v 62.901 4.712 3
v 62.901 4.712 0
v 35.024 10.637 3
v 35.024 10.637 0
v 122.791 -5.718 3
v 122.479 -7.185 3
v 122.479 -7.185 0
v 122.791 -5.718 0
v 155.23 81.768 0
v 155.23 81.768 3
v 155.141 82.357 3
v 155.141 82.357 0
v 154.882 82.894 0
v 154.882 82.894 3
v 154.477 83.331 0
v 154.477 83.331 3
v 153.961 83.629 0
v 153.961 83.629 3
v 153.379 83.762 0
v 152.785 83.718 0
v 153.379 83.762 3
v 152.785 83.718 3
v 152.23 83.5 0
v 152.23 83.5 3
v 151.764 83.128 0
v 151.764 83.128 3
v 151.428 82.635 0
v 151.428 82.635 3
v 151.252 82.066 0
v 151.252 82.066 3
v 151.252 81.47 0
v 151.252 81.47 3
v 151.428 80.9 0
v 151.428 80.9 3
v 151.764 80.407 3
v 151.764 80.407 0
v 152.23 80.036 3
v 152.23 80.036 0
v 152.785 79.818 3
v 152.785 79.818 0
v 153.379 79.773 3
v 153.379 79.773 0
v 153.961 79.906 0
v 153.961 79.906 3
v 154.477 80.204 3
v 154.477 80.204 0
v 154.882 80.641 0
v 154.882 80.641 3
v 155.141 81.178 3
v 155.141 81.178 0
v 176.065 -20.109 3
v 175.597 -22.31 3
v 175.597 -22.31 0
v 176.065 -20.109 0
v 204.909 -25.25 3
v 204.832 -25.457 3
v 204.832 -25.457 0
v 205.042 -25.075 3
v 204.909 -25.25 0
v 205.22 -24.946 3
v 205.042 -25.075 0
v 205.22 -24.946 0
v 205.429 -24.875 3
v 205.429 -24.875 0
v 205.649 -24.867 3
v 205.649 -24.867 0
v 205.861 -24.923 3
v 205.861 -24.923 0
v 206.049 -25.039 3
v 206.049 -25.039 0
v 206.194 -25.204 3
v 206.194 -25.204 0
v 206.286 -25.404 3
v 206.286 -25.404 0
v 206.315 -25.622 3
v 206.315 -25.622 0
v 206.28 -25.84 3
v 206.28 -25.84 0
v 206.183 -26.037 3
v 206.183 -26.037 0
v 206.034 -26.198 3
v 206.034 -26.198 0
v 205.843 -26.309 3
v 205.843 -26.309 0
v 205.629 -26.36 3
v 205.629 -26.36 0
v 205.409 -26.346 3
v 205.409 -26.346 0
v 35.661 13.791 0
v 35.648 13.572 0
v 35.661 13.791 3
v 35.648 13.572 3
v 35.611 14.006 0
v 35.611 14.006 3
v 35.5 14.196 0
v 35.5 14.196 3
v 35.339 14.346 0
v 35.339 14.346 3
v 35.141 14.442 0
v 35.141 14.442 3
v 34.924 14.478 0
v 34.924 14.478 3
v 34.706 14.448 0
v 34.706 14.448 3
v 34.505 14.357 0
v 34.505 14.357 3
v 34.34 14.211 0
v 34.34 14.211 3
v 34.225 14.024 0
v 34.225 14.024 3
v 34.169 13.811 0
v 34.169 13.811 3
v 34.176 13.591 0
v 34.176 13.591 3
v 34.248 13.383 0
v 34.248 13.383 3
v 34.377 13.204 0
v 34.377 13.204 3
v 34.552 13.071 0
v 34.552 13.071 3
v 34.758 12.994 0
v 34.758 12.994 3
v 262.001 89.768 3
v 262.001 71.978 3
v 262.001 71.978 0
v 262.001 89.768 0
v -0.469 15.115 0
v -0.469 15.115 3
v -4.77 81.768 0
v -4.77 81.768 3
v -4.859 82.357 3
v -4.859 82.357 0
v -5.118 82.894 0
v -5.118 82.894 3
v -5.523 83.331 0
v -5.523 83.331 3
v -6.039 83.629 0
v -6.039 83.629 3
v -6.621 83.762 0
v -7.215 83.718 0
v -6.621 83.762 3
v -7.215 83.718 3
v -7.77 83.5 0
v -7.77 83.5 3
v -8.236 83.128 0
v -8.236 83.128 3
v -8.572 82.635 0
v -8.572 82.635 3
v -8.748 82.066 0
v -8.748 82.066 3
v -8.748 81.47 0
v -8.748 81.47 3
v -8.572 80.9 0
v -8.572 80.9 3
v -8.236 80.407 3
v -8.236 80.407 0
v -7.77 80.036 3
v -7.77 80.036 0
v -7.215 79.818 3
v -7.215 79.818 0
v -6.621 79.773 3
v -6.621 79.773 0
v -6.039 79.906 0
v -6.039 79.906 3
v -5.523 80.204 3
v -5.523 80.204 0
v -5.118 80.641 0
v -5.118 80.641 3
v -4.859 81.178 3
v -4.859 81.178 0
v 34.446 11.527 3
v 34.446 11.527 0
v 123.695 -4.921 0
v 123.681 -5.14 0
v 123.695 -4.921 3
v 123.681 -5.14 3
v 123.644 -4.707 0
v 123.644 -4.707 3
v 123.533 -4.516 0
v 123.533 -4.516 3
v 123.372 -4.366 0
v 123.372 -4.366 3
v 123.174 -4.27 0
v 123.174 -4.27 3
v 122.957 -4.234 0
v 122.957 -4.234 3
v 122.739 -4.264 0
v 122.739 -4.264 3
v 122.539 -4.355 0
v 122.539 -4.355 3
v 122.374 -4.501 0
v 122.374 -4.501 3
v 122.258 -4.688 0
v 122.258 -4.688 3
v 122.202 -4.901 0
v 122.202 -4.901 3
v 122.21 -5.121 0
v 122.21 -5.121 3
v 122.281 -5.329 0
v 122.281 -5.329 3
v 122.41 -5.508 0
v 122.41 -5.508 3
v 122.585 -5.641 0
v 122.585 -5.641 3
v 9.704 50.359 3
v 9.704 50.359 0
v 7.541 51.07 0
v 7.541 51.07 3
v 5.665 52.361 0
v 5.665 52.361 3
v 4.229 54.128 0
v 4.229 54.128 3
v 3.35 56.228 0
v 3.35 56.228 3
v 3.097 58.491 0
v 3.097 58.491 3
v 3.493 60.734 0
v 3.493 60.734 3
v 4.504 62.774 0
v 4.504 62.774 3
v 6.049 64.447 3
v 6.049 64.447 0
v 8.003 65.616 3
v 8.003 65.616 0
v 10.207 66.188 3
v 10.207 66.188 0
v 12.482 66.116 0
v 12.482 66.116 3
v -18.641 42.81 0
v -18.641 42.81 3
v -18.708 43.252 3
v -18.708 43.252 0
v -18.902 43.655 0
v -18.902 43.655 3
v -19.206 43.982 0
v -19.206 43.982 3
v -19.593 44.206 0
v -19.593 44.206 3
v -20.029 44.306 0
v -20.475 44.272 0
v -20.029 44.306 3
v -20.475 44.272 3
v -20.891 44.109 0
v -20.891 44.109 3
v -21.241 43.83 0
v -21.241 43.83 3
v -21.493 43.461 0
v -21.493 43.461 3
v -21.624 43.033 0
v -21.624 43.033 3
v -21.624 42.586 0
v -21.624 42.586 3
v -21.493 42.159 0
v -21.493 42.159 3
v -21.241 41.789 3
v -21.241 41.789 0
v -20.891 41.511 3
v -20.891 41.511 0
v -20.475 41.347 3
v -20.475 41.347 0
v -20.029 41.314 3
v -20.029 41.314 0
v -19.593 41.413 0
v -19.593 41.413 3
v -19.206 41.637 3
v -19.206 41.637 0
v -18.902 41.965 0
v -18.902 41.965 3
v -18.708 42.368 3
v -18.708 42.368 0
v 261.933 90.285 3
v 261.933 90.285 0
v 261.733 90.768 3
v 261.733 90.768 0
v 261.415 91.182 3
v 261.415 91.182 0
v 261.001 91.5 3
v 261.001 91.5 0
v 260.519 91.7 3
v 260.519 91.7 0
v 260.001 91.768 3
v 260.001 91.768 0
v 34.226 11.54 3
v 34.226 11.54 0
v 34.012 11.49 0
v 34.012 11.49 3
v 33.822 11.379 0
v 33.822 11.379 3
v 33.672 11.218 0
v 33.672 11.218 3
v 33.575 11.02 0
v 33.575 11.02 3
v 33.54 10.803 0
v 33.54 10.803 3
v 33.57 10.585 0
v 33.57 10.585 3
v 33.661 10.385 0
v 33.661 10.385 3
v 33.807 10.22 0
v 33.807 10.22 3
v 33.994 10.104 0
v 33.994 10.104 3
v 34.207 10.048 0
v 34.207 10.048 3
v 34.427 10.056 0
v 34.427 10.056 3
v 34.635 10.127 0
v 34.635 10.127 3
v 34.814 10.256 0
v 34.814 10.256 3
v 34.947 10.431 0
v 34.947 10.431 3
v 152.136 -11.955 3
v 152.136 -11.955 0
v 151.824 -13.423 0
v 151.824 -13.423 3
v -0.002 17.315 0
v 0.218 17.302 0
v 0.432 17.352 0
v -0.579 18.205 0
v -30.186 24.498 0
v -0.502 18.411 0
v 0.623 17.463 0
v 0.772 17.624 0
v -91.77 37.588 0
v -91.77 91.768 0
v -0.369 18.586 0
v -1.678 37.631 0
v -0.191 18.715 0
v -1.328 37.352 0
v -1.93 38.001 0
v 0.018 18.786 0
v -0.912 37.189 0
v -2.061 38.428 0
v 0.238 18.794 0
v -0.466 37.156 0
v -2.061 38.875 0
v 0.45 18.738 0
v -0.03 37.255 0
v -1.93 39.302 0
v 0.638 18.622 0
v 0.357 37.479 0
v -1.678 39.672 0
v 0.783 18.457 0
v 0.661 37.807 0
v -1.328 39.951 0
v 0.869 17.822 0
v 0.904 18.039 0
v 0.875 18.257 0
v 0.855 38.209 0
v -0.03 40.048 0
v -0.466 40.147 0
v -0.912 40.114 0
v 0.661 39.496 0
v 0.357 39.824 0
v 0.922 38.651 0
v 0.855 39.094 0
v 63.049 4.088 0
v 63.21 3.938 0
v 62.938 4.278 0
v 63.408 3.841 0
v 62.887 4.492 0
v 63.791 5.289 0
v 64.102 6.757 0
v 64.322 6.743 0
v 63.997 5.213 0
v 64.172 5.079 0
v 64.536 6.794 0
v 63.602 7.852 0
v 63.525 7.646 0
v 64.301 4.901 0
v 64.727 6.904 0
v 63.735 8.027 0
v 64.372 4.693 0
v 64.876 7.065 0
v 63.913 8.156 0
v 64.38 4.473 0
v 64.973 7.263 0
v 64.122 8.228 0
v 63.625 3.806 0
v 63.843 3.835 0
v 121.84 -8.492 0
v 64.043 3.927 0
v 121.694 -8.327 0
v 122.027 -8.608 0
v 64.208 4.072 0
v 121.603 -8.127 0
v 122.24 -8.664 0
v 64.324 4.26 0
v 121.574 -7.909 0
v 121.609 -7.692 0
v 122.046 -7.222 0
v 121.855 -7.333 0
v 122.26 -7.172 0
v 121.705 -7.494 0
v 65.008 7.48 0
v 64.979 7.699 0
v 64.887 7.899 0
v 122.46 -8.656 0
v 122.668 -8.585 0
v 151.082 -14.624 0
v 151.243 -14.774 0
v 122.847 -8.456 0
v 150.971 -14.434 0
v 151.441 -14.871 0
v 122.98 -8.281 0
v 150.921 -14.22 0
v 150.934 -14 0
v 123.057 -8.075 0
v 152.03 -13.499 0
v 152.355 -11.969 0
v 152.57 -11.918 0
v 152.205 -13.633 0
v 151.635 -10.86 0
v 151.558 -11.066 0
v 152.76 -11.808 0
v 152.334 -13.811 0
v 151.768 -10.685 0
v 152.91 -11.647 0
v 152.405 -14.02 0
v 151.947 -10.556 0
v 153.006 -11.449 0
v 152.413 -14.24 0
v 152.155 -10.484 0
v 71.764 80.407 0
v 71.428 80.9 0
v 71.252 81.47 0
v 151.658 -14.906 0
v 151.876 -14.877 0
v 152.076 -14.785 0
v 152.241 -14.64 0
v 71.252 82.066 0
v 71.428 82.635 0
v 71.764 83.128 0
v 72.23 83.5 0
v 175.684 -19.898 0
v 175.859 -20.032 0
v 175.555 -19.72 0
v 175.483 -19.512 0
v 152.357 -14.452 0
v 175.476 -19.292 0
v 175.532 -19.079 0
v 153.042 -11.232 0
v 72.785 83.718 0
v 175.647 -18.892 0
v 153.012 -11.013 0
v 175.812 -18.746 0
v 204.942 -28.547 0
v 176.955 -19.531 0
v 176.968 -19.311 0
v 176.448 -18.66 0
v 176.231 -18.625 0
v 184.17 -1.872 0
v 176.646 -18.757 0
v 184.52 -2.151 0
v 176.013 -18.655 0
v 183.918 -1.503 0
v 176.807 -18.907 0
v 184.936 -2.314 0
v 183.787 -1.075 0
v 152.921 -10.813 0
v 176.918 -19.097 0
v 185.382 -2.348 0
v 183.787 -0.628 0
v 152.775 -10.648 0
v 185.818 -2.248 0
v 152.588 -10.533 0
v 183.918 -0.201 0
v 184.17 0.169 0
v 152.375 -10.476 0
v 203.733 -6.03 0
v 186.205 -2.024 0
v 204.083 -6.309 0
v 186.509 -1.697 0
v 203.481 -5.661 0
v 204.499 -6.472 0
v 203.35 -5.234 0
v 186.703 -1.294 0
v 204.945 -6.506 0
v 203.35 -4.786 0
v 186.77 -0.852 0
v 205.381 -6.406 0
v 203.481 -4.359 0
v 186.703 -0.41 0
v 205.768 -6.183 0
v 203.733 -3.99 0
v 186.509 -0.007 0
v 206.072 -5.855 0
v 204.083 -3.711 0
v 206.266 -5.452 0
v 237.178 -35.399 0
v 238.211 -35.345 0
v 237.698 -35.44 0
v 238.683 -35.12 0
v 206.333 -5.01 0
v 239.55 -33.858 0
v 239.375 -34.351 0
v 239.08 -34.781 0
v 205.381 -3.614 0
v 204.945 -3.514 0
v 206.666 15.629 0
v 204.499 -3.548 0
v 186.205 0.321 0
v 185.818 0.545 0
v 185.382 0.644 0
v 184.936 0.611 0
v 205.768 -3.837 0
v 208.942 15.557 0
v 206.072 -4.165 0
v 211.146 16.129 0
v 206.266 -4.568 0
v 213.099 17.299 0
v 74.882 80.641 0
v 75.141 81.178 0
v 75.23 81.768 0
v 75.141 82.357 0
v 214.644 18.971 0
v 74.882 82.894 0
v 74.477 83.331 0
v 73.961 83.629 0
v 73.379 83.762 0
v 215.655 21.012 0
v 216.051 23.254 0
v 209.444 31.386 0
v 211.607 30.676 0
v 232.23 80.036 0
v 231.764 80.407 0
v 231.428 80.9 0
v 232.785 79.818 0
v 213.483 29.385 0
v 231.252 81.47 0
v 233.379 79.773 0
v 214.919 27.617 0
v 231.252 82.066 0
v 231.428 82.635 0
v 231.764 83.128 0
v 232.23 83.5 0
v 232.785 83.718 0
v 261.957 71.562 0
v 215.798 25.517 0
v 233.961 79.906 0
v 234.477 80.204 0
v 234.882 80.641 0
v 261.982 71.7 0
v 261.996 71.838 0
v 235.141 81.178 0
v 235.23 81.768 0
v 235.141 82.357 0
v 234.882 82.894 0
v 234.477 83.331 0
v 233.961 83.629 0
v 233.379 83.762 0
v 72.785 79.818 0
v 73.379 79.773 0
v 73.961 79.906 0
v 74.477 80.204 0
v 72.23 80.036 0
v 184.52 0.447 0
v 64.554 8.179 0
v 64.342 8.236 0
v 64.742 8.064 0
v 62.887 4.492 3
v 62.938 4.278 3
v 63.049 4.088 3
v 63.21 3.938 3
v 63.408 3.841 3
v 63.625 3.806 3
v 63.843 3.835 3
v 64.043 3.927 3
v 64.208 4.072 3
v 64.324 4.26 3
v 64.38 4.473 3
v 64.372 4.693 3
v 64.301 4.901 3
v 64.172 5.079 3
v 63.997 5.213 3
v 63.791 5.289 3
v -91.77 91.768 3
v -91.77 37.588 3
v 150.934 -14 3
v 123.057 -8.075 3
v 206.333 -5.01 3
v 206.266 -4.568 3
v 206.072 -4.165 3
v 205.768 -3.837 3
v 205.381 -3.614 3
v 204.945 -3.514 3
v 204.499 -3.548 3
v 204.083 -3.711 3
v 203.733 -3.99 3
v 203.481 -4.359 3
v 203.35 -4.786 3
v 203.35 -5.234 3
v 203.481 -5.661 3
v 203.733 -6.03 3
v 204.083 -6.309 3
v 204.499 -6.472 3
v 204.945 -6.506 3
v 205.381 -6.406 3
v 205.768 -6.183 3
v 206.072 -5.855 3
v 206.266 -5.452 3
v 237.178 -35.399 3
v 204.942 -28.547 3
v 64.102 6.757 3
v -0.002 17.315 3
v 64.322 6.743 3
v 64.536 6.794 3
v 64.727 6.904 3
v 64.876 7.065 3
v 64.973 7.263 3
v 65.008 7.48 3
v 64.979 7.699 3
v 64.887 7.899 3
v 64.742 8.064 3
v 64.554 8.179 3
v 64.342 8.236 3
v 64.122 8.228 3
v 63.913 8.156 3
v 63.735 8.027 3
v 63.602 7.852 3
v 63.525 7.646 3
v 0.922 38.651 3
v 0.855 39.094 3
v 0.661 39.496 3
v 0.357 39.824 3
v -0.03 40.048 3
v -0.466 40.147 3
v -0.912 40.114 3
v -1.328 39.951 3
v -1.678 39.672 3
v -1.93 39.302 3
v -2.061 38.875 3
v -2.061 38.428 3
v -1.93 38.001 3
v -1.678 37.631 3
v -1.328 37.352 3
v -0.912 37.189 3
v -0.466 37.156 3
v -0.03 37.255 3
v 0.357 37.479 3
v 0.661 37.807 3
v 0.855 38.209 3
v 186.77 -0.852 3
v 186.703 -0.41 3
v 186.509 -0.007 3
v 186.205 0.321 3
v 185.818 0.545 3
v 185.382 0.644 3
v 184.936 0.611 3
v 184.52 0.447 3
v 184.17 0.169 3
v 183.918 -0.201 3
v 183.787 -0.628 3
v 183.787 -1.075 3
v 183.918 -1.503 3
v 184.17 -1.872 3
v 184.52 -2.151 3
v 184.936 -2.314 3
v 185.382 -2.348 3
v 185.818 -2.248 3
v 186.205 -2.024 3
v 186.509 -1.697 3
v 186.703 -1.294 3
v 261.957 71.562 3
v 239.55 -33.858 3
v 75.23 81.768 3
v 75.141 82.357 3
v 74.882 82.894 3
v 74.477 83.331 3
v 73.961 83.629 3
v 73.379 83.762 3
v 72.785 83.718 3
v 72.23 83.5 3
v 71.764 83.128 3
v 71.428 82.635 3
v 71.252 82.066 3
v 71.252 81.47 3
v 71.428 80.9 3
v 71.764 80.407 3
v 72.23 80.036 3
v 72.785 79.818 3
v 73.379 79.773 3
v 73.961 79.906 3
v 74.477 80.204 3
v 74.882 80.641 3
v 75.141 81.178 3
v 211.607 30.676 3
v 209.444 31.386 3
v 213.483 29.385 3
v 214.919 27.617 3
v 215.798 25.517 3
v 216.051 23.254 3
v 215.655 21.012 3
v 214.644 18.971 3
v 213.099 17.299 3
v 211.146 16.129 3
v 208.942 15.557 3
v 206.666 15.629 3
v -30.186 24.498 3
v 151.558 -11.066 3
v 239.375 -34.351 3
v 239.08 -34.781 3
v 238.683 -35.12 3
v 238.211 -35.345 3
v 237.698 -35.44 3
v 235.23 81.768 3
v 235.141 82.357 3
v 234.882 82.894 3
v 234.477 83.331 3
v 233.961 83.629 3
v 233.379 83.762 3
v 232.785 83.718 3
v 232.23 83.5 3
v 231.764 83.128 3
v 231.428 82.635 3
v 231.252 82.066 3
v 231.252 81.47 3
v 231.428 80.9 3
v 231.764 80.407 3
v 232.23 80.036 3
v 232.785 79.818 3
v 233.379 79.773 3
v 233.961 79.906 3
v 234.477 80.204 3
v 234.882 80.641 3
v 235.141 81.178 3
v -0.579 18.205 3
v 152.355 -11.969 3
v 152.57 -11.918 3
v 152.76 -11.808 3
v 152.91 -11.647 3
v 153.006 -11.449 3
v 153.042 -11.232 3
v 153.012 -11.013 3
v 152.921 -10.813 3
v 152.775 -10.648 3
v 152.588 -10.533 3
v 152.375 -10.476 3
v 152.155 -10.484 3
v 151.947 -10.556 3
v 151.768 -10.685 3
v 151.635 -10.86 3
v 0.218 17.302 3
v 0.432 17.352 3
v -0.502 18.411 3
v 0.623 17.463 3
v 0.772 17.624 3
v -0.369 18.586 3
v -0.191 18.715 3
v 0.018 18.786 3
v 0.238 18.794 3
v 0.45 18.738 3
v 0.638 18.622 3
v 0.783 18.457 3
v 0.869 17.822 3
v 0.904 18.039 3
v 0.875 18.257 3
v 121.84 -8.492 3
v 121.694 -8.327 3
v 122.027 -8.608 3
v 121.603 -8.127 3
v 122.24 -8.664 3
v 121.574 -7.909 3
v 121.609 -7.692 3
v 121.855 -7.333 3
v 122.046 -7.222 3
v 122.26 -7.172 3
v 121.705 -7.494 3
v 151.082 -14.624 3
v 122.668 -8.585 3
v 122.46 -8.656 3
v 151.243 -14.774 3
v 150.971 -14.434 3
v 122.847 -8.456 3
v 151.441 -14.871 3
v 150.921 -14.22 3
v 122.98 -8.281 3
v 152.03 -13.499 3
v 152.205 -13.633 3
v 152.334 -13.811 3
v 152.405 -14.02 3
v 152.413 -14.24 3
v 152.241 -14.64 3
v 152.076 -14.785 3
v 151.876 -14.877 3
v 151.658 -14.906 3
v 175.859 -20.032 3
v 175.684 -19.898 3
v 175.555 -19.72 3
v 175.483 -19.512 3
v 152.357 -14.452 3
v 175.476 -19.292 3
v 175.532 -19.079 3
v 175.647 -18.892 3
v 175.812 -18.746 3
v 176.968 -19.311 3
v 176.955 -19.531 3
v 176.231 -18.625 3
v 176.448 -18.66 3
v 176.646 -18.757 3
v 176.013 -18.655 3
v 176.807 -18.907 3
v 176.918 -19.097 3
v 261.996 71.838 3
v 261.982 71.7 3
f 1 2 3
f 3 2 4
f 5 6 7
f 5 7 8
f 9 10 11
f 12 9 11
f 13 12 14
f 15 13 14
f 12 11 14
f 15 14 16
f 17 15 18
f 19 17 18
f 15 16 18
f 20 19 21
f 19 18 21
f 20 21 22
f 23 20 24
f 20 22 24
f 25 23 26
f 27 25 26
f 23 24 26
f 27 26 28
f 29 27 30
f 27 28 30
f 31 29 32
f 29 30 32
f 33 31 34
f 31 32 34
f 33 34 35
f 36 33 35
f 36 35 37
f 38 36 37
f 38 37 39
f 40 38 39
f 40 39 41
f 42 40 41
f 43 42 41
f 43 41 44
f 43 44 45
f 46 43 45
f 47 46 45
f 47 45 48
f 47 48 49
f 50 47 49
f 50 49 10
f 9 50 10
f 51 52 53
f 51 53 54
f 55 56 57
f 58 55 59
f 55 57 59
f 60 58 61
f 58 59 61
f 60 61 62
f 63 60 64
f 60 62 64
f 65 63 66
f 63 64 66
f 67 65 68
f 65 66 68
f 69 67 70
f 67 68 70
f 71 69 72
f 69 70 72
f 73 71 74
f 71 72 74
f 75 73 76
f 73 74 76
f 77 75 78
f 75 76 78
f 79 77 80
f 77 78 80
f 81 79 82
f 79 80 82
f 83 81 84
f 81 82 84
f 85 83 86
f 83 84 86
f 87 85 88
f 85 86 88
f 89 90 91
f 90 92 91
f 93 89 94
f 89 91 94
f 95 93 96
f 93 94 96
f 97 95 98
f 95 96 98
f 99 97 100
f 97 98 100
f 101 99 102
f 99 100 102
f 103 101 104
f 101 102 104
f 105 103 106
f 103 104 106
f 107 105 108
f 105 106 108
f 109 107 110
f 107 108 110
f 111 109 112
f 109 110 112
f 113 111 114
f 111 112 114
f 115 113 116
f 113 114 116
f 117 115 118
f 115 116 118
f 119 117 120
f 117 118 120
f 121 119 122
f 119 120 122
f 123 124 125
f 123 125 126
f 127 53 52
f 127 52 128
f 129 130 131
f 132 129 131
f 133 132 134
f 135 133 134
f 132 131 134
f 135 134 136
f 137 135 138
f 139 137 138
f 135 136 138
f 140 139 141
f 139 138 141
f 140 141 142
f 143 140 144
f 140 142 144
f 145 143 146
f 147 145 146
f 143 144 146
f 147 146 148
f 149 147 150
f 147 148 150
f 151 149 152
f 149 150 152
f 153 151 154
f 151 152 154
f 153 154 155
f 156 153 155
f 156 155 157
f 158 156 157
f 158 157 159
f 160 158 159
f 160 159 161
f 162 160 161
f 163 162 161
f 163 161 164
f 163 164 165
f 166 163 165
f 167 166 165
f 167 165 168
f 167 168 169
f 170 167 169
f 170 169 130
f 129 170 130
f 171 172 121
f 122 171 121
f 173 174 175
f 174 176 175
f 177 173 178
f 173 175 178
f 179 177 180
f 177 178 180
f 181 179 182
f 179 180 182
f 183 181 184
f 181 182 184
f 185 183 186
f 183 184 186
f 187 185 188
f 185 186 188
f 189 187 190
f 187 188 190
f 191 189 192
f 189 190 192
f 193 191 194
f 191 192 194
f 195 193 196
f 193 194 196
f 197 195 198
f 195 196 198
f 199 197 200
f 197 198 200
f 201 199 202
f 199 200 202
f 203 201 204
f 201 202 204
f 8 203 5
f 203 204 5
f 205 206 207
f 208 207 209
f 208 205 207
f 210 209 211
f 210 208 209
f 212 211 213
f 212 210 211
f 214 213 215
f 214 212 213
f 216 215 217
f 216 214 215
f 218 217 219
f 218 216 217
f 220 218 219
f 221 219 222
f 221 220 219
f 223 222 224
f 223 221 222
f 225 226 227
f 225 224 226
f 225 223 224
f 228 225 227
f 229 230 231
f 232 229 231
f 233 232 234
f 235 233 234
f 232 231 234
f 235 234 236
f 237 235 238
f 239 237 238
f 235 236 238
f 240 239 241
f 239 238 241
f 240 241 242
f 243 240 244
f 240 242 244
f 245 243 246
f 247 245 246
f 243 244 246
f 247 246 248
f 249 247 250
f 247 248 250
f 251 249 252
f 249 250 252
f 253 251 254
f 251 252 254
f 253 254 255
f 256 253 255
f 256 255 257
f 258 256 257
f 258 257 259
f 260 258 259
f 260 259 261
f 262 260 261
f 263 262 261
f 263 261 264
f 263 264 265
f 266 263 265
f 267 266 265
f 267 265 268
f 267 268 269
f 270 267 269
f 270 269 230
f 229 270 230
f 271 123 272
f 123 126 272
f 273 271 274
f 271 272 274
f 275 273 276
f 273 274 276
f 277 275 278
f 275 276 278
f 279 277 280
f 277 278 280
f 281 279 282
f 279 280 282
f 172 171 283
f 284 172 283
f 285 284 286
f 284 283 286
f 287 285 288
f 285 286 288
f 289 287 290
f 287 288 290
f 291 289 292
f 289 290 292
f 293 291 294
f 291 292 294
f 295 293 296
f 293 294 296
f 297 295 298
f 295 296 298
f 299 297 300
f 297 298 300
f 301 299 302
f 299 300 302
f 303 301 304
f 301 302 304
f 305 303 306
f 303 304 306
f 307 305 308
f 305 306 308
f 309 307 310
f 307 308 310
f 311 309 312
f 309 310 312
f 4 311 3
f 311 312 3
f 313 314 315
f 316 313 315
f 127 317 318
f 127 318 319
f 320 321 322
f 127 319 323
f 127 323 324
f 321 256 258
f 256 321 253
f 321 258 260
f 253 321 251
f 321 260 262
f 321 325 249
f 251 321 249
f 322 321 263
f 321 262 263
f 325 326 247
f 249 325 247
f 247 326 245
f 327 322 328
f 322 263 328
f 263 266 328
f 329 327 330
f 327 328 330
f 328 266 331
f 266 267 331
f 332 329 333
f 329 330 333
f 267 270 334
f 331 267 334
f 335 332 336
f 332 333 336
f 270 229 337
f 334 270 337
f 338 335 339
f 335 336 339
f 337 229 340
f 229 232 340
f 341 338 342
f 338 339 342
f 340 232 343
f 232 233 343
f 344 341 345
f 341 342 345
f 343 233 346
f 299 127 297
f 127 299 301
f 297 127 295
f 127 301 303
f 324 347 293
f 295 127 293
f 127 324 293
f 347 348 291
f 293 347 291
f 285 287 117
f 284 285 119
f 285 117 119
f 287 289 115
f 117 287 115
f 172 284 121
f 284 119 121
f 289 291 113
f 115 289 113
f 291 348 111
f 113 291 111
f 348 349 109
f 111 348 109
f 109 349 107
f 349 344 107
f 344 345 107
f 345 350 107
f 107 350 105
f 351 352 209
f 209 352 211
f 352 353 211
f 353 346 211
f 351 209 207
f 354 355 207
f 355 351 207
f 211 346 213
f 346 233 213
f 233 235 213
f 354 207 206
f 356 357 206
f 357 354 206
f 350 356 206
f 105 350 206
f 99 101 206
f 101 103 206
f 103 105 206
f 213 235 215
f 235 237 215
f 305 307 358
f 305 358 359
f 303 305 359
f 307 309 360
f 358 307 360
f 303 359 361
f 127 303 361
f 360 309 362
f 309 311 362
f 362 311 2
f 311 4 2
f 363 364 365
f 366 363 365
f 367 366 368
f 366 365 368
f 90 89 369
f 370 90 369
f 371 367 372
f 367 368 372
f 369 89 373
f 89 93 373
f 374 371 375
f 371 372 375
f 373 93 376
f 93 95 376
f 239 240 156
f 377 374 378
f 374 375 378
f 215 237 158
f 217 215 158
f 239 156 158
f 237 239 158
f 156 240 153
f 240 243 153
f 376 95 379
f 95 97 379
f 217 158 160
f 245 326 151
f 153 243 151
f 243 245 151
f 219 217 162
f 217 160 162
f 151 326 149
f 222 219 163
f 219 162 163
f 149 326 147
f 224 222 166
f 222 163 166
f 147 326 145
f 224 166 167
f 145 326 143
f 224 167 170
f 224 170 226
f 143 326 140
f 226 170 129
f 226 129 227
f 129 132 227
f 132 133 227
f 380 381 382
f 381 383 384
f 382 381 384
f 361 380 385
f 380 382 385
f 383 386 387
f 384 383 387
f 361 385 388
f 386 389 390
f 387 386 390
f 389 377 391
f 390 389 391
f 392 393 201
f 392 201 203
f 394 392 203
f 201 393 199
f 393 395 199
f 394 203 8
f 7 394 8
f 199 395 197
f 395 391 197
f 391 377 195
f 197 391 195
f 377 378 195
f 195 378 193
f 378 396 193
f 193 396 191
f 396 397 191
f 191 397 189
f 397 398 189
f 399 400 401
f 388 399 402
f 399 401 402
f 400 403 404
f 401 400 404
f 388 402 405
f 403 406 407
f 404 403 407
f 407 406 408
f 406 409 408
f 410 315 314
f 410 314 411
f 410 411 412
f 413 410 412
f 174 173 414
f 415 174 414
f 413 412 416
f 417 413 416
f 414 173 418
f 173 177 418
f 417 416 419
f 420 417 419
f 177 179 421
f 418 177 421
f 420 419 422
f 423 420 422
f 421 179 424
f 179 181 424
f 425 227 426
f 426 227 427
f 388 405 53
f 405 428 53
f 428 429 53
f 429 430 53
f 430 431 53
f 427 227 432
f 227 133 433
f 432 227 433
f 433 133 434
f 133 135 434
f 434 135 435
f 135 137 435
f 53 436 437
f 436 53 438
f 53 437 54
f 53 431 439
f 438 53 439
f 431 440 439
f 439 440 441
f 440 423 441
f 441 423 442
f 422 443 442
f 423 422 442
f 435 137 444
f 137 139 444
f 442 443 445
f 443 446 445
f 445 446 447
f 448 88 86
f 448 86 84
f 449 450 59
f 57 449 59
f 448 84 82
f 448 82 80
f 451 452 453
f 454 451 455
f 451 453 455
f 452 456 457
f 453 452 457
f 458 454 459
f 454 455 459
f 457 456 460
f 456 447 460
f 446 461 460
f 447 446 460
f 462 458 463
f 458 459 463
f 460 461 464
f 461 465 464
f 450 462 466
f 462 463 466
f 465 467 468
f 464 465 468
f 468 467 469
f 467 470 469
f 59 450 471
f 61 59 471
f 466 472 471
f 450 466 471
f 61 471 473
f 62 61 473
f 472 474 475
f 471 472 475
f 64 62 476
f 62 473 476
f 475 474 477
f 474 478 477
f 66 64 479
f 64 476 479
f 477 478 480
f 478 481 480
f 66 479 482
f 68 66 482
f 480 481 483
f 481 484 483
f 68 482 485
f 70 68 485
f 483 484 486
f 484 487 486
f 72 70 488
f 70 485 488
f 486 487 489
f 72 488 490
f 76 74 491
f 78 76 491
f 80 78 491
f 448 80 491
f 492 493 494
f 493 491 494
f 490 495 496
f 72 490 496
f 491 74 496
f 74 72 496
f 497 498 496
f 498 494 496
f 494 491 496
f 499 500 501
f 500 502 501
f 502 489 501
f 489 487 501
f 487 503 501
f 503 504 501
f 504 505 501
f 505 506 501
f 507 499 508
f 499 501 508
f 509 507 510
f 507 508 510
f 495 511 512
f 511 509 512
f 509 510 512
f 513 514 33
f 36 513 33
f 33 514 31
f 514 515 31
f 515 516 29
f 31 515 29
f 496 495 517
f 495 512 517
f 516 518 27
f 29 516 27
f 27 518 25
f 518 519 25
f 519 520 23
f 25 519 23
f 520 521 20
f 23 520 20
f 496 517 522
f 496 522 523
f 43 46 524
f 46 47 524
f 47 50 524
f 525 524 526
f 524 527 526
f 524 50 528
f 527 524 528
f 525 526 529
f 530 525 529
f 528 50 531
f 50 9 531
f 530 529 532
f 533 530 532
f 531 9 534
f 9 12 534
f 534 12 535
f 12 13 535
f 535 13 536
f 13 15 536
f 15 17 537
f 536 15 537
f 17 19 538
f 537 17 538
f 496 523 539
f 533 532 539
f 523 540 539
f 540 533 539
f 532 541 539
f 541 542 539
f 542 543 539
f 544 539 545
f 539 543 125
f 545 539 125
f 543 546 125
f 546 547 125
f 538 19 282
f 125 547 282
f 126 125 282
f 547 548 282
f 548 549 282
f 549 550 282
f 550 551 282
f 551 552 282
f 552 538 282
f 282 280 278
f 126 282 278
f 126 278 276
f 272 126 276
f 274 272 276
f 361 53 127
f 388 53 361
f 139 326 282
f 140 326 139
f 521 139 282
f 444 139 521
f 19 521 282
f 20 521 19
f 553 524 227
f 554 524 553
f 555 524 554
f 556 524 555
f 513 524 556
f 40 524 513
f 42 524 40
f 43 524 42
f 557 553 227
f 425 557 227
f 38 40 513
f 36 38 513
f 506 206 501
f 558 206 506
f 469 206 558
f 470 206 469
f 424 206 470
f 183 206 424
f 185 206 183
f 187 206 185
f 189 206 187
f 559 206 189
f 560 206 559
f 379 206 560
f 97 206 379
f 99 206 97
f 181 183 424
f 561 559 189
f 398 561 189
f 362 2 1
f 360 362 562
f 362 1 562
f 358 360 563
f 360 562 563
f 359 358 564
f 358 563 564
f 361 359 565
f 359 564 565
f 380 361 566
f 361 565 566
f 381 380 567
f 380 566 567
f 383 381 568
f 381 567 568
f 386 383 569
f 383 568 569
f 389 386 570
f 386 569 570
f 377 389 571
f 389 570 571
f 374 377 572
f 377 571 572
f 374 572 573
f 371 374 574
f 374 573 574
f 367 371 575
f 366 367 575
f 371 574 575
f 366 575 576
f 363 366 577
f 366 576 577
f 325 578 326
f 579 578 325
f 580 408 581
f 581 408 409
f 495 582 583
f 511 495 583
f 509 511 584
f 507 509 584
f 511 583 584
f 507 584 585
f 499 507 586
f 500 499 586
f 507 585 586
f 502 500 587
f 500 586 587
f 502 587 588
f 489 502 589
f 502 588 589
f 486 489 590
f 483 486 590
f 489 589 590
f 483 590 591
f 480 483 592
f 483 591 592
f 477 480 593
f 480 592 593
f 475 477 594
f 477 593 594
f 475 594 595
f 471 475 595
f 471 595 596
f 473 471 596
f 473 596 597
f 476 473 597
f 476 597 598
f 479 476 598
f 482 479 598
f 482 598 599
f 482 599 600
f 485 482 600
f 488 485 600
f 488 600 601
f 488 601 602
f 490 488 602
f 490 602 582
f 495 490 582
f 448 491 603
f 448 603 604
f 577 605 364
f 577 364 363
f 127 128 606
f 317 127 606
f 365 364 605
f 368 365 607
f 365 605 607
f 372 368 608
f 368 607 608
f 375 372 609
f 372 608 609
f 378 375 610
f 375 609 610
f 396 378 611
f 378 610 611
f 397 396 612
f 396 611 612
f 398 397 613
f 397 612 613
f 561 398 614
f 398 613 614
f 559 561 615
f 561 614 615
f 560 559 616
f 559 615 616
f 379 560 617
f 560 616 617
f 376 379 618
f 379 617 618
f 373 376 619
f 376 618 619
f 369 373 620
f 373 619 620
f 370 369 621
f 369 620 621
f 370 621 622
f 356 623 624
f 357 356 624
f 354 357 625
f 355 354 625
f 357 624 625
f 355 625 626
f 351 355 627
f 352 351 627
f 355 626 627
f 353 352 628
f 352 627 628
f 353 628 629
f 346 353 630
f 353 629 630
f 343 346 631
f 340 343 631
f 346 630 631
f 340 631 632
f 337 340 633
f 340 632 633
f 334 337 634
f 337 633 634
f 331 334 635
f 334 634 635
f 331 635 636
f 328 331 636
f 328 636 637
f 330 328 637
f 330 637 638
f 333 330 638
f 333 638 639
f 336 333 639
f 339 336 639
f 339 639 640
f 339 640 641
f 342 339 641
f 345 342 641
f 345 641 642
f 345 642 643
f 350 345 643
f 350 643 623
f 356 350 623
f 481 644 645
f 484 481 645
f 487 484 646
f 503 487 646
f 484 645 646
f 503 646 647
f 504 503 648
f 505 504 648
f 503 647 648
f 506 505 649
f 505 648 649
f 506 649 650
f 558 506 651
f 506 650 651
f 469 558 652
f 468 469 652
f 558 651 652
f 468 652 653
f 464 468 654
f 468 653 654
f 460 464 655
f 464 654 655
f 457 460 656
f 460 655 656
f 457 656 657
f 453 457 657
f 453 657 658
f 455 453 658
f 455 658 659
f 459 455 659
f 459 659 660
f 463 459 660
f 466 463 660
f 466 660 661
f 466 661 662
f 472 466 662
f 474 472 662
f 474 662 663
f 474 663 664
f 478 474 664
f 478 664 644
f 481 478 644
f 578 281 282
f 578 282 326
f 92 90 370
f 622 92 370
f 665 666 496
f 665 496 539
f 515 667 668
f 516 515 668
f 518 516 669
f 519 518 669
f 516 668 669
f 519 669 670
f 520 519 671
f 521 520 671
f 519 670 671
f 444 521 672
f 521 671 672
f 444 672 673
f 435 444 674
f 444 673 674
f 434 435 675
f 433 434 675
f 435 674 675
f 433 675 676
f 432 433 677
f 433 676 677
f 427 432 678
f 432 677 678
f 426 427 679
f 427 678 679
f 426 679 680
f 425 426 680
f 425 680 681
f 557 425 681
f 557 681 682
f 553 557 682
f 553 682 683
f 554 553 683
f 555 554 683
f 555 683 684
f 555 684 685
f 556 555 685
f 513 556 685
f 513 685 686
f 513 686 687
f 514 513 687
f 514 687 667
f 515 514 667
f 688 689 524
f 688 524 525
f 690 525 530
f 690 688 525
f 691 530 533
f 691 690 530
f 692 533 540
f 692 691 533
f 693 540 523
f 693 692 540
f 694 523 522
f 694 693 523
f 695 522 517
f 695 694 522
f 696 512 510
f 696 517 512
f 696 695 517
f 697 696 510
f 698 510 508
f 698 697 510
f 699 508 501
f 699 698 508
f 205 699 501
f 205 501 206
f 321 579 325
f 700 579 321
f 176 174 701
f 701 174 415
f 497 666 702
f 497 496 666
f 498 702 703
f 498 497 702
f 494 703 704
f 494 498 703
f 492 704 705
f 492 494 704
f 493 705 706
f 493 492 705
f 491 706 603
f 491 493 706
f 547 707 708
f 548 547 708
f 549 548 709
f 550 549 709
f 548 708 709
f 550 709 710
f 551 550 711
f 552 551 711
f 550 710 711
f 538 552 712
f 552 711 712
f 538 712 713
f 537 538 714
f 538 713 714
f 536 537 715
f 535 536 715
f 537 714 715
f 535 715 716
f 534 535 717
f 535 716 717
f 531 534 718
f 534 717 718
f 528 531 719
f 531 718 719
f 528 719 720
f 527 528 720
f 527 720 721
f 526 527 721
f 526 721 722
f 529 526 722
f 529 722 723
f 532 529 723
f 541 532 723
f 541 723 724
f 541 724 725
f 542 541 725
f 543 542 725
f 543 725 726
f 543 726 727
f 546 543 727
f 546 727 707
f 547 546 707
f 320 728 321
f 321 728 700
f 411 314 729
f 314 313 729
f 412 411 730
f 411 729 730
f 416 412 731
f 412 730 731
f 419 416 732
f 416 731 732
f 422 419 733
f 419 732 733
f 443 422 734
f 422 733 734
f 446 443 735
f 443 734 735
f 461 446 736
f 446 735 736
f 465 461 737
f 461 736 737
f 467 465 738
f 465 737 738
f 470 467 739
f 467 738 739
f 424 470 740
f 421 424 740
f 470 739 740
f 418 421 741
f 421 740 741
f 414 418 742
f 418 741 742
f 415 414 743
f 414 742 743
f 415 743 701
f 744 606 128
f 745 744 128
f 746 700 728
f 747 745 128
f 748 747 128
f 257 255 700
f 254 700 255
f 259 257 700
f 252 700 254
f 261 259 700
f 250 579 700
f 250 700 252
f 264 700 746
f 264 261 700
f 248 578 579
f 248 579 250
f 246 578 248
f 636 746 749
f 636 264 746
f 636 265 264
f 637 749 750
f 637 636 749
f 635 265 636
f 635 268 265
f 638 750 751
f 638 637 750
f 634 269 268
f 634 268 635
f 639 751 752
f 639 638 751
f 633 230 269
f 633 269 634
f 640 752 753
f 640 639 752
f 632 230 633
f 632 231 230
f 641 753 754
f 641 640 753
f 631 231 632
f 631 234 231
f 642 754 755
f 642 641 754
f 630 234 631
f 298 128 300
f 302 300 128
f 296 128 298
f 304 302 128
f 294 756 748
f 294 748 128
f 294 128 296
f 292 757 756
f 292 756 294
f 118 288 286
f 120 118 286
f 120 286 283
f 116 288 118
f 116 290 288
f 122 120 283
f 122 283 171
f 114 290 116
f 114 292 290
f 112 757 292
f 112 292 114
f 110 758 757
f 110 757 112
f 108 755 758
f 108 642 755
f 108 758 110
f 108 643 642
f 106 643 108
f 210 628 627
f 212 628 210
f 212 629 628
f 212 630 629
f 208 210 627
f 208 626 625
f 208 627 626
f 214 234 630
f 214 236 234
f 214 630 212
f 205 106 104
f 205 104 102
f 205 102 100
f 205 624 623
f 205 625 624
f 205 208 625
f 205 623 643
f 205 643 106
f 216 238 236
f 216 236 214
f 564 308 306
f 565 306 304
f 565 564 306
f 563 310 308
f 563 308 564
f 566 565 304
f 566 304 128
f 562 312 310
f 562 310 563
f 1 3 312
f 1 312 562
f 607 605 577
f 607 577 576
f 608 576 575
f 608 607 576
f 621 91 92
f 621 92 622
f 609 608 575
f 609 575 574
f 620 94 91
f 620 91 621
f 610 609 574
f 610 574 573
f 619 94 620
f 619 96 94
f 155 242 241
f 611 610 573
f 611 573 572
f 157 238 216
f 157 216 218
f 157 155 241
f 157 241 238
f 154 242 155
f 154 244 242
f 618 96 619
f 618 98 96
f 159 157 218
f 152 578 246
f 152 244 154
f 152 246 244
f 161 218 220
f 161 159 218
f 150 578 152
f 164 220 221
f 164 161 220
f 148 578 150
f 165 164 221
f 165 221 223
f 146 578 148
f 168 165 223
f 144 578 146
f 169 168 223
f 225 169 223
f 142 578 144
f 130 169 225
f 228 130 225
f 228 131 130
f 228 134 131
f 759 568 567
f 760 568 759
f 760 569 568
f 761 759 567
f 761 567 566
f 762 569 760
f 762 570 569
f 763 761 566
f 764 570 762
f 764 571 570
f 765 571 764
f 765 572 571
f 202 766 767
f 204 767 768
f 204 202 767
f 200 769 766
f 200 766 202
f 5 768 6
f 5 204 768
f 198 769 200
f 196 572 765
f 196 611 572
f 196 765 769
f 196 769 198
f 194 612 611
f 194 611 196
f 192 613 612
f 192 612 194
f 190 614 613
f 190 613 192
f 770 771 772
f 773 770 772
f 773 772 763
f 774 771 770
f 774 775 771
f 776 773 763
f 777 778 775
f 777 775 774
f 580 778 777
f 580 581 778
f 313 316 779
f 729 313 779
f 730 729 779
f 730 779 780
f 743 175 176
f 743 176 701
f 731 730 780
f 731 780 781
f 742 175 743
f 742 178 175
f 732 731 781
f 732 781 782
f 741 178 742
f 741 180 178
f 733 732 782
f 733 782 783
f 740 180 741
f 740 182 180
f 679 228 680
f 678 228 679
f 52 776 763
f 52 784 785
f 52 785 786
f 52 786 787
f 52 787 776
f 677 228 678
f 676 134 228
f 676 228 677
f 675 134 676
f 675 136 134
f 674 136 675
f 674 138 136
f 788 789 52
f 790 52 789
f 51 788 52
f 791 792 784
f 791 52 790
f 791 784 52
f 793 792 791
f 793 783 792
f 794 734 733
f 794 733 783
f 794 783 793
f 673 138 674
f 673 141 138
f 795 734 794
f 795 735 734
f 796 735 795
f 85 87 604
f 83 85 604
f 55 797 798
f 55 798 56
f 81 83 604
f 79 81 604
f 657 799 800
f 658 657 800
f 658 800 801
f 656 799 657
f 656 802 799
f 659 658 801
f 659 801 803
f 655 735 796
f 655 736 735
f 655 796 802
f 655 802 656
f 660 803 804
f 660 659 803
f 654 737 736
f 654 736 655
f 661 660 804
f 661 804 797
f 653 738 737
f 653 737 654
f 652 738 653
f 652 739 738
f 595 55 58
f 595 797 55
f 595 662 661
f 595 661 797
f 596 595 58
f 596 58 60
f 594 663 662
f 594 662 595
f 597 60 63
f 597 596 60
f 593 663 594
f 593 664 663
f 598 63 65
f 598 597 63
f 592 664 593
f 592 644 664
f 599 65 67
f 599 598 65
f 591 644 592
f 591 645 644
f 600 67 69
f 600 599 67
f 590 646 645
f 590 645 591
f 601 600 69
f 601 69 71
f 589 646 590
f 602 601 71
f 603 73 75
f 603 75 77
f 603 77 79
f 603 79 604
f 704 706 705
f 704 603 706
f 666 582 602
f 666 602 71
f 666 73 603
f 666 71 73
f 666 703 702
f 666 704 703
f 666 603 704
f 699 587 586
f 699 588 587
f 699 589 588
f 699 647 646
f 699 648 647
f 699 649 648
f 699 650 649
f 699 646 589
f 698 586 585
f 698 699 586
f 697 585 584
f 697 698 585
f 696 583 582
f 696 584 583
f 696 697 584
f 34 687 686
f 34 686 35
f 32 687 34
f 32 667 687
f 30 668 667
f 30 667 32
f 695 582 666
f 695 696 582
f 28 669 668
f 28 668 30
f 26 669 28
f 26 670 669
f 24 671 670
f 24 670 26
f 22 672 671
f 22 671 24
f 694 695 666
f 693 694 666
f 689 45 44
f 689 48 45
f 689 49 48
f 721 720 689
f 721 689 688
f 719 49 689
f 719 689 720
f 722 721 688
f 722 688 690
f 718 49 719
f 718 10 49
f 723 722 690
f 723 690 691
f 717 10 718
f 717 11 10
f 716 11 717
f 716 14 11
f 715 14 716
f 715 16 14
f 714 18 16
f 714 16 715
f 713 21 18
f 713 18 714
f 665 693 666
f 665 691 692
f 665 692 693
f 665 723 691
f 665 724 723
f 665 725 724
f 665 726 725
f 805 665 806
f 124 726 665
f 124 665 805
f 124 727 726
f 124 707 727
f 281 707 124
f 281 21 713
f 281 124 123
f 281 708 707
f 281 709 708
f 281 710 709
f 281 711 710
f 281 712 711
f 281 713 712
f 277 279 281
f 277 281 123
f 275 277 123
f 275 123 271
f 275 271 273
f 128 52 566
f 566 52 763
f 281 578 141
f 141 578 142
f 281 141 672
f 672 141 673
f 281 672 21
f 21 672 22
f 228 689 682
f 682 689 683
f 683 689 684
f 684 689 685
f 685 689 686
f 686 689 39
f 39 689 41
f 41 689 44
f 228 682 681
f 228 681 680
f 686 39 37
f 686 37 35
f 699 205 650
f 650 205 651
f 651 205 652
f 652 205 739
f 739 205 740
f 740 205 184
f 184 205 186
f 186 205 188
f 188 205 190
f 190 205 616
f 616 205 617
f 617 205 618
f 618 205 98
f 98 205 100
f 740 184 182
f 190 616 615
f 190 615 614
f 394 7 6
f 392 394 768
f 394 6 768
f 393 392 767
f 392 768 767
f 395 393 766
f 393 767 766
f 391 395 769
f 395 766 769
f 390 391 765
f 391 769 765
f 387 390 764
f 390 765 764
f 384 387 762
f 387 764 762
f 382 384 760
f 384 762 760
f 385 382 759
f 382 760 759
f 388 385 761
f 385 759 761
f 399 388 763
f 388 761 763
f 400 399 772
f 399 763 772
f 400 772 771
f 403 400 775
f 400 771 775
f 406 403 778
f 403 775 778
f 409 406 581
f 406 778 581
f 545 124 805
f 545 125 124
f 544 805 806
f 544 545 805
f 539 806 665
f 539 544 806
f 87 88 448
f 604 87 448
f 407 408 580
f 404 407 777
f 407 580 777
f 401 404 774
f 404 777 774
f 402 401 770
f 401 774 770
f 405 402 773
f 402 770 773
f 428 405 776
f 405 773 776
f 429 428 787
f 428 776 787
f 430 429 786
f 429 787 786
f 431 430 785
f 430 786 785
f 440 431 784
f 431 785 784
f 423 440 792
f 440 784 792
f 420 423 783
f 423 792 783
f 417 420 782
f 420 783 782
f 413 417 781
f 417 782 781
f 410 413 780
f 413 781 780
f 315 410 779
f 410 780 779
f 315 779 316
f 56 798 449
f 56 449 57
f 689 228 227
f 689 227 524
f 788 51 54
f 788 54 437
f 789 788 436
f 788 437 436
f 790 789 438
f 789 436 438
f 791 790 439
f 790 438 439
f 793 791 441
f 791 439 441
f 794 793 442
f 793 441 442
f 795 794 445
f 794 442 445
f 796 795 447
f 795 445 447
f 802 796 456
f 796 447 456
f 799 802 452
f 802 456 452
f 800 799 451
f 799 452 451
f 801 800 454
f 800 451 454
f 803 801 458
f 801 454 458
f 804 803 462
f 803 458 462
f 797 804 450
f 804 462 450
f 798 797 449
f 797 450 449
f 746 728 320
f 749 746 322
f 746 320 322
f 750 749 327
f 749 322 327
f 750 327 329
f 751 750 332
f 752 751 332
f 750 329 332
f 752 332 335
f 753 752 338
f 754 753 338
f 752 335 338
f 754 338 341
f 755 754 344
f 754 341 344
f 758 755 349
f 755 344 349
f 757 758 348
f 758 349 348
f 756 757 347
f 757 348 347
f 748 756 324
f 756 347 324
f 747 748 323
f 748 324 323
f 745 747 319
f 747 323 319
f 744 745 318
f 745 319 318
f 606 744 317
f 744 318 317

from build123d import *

# Parameters (mm, degrees)
EXTRUDE_1_DEPTH      = 3
CUT_EXTRUDE_2_DEPTH  = 10
CUT_EXTRUDE_6_DEPTH  = 4
SKETCH_12_W          = 293.771267283
SKETCH_12_H          = 20
EXTRUDE_2_DEPTH      = 3
SKETCH_13_R          = 2
CUT_EXTRUDE_9_DEPTH  = 4
CUT_EXTRUDE_10_DEPTH = 10
MM_2_D               = 1.5
CUT_EXTRUDE_11_DEPTH = 4
MM_3_D               = 1.5
FILLET_1_R           = 2
EXTRUDE_3_DEPTH      = 3
SKETCH_4_R           = 1.5
CUT_EXTRUDE_3_DEPTH  = 10


with BuildPart() as part:
    # 草图1 → 凸台-拉伸1 (new body)
    with BuildSketch(Plane.XY):
        Polygon((-31.770103996, 71.767703031), (318.229896004, 71.767703031), (292.931935015, -47.249845949), (-31.770103996, 21.767703031), align=None)
    extrude(amount=EXTRUDE_1_DEPTH)

    # 草图3 → 切除-拉伸2 (cut)
    with BuildSketch(Plane.XY.offset(3)):
        Polygon((-0.469380772, 15.114528924), (0.1543543, 18.048971727), (-31.770103996, 24.834724815), (-31.770103996, 21.767703031), align=None)
        Polygon((176.220922432, -19.375132621), (205.565350454, -25.612483345), (204.941615382, -28.546926147), (175.59718736, -22.309575423), align=None)
    extrude(amount=-CUT_EXTRUDE_2_DEPTH, mode=Mode.SUBTRACT)

    # 草图7 → 切除-拉伸6 (cut, through all)
    with BuildSketch(Plane.XY.offset(3)):
        Polygon((292.931935015, -47.249845949), (239.133816975, -35.814702954), (262.001163287, 71.767703031), (318.229896004, 71.767703031), align=None)
    extrude(amount=-CUT_EXTRUDE_6_DEPTH, mode=Mode.SUBTRACT)

    # 草图12 → 凸台-拉伸2 (add)
    with BuildSketch(Plane.XY.offset(3)):
        with Locations((115.115529646, 81.767703031)):
            Rectangle(SKETCH_12_W, SKETCH_12_H)
    extrude(amount=-EXTRUDE_2_DEPTH)

    # 草图13 → 切除-拉伸9 (cut, through all)
    with BuildSketch(Plane.XY.offset(3)):
        with Locations((-6.770103996, 81.767703031)):
            Circle(SKETCH_13_R)
        with Locations((73.229896004, 81.767703031)):
            Circle(SKETCH_13_R)
        with Locations((153.229896004, 81.767703031)):
            Circle(SKETCH_13_R)
        with Locations((233.229896004, 81.767703031)):
            Circle(SKETCH_13_R)
    extrude(amount=-CUT_EXTRUDE_9_DEPTH, mode=Mode.SUBTRACT)

    # 草图14 → 切除-拉伸10 (cut)
    with BuildSketch(Plane.XY.offset(3)):
        with BuildLine():
            Line((12.482478027, 66.115949401), (209.444028629, 31.386313867))
            ThreePointArc((209.444028629, 31.386313867), (215.933305232, 22.118666422), (206.665657786, 15.629389819))
            Line((206.665657786, 15.629389819), (9.704107184, 50.359025353))
            ThreePointArc((9.704107184, 50.359025353), (3.214830581, 59.626672798), (12.482478027, 66.115949401))
        make_face()
    extrude(amount=-CUT_EXTRUDE_10_DEPTH, mode=Mode.SUBTRACT)

    # 大小mm 暗销槽口2 (through all)
    with Locations(Plane.XY.offset(3)):
        with Locations((0.1543543, 18.048971727), (176.220922432, -19.375132621), (205.565350454, -25.612483345)):
            Hole(MM_2_D / 2)

    # 草图18 → 切除-拉伸11 (cut, through all)
    with BuildSketch(Plane(origin=(0, 0, 0), x_dir=(-1, 0, 0), z_dir=(0, 0, -1))):
        Polygon((-152.291642964, -11.221785469), (-151.667907892, -14.156228271), (-122.32347987, -7.918877547), (-122.947214942, -4.984434744), align=None)
        Polygon((-64.258358898, 7.490266705), (-63.634623826, 4.555823902), (-34.290195804, 10.793174627), (-34.913930876, 13.727617429), align=None)
    extrude(amount=-CUT_EXTRUDE_11_DEPTH, mode=Mode.SUBTRACT)

    # 大小mm 暗销槽口3 (through all)
    with Locations(Plane(origin=(0, 0, 0), x_dir=(-1, 0, 0), z_dir=(0, 0, -1))):
        with Locations((-152.291642964, -11.221785469), (-151.667907892, -14.156228271), (-122.32347987, -7.918877547), (-122.947214942, -4.984434744), (-64.258358898, 7.490266705), (-63.634623826, 4.555823902), (-34.290195804, 10.793174627), (-34.913930876, 13.727617429)):
            Hole(MM_3_D / 2)

    # 圆角1
    fillet_1_edges = [part.edges().sort_by_distance(p)[0] for p in [
        (-31.770103996, 24.834724815, 1.5),
        (239.133816975, -35.814702954, 1.5),
        (262.001163287, 71.767703031, 1.5),
        (-31.770103996, 91.767703031, 1.5),
        (262.001163287, 91.767703031, 1.5),
    ]]
    fillet(fillet_1_edges, radius=FILLET_1_R)

    # 草图21 → 凸台-拉伸3 (add)
    with BuildSketch(Plane.XY.offset(3)):
        Polygon((-91.770103996, 37.588118515), (-13.862424826, 21.028330103), (-13.862424826, 91.767703031), (-81.382896655, 91.767703031), (-91.770103996, 91.767703031), align=None)
    extrude(amount=-EXTRUDE_3_DEPTH)

    # 草图4 → 切除-拉伸3 (cut)
    with BuildSketch(Plane.XY.offset(3)):
        with Locations((-20.141101902, 42.809716012)):
            Circle(SKETCH_4_R)
        with Locations((-0.578149887, 38.651482195)):
            Circle(SKETCH_4_R)
        with Locations((185.269894252, -0.85173906)):
            Circle(SKETCH_4_R)
        with Locations((204.832846267, -5.009972876)):
            Circle(SKETCH_4_R)
    extrude(amount=-CUT_EXTRUDE_3_DEPTH, mode=Mode.SUBTRACT)


solid = part.part
